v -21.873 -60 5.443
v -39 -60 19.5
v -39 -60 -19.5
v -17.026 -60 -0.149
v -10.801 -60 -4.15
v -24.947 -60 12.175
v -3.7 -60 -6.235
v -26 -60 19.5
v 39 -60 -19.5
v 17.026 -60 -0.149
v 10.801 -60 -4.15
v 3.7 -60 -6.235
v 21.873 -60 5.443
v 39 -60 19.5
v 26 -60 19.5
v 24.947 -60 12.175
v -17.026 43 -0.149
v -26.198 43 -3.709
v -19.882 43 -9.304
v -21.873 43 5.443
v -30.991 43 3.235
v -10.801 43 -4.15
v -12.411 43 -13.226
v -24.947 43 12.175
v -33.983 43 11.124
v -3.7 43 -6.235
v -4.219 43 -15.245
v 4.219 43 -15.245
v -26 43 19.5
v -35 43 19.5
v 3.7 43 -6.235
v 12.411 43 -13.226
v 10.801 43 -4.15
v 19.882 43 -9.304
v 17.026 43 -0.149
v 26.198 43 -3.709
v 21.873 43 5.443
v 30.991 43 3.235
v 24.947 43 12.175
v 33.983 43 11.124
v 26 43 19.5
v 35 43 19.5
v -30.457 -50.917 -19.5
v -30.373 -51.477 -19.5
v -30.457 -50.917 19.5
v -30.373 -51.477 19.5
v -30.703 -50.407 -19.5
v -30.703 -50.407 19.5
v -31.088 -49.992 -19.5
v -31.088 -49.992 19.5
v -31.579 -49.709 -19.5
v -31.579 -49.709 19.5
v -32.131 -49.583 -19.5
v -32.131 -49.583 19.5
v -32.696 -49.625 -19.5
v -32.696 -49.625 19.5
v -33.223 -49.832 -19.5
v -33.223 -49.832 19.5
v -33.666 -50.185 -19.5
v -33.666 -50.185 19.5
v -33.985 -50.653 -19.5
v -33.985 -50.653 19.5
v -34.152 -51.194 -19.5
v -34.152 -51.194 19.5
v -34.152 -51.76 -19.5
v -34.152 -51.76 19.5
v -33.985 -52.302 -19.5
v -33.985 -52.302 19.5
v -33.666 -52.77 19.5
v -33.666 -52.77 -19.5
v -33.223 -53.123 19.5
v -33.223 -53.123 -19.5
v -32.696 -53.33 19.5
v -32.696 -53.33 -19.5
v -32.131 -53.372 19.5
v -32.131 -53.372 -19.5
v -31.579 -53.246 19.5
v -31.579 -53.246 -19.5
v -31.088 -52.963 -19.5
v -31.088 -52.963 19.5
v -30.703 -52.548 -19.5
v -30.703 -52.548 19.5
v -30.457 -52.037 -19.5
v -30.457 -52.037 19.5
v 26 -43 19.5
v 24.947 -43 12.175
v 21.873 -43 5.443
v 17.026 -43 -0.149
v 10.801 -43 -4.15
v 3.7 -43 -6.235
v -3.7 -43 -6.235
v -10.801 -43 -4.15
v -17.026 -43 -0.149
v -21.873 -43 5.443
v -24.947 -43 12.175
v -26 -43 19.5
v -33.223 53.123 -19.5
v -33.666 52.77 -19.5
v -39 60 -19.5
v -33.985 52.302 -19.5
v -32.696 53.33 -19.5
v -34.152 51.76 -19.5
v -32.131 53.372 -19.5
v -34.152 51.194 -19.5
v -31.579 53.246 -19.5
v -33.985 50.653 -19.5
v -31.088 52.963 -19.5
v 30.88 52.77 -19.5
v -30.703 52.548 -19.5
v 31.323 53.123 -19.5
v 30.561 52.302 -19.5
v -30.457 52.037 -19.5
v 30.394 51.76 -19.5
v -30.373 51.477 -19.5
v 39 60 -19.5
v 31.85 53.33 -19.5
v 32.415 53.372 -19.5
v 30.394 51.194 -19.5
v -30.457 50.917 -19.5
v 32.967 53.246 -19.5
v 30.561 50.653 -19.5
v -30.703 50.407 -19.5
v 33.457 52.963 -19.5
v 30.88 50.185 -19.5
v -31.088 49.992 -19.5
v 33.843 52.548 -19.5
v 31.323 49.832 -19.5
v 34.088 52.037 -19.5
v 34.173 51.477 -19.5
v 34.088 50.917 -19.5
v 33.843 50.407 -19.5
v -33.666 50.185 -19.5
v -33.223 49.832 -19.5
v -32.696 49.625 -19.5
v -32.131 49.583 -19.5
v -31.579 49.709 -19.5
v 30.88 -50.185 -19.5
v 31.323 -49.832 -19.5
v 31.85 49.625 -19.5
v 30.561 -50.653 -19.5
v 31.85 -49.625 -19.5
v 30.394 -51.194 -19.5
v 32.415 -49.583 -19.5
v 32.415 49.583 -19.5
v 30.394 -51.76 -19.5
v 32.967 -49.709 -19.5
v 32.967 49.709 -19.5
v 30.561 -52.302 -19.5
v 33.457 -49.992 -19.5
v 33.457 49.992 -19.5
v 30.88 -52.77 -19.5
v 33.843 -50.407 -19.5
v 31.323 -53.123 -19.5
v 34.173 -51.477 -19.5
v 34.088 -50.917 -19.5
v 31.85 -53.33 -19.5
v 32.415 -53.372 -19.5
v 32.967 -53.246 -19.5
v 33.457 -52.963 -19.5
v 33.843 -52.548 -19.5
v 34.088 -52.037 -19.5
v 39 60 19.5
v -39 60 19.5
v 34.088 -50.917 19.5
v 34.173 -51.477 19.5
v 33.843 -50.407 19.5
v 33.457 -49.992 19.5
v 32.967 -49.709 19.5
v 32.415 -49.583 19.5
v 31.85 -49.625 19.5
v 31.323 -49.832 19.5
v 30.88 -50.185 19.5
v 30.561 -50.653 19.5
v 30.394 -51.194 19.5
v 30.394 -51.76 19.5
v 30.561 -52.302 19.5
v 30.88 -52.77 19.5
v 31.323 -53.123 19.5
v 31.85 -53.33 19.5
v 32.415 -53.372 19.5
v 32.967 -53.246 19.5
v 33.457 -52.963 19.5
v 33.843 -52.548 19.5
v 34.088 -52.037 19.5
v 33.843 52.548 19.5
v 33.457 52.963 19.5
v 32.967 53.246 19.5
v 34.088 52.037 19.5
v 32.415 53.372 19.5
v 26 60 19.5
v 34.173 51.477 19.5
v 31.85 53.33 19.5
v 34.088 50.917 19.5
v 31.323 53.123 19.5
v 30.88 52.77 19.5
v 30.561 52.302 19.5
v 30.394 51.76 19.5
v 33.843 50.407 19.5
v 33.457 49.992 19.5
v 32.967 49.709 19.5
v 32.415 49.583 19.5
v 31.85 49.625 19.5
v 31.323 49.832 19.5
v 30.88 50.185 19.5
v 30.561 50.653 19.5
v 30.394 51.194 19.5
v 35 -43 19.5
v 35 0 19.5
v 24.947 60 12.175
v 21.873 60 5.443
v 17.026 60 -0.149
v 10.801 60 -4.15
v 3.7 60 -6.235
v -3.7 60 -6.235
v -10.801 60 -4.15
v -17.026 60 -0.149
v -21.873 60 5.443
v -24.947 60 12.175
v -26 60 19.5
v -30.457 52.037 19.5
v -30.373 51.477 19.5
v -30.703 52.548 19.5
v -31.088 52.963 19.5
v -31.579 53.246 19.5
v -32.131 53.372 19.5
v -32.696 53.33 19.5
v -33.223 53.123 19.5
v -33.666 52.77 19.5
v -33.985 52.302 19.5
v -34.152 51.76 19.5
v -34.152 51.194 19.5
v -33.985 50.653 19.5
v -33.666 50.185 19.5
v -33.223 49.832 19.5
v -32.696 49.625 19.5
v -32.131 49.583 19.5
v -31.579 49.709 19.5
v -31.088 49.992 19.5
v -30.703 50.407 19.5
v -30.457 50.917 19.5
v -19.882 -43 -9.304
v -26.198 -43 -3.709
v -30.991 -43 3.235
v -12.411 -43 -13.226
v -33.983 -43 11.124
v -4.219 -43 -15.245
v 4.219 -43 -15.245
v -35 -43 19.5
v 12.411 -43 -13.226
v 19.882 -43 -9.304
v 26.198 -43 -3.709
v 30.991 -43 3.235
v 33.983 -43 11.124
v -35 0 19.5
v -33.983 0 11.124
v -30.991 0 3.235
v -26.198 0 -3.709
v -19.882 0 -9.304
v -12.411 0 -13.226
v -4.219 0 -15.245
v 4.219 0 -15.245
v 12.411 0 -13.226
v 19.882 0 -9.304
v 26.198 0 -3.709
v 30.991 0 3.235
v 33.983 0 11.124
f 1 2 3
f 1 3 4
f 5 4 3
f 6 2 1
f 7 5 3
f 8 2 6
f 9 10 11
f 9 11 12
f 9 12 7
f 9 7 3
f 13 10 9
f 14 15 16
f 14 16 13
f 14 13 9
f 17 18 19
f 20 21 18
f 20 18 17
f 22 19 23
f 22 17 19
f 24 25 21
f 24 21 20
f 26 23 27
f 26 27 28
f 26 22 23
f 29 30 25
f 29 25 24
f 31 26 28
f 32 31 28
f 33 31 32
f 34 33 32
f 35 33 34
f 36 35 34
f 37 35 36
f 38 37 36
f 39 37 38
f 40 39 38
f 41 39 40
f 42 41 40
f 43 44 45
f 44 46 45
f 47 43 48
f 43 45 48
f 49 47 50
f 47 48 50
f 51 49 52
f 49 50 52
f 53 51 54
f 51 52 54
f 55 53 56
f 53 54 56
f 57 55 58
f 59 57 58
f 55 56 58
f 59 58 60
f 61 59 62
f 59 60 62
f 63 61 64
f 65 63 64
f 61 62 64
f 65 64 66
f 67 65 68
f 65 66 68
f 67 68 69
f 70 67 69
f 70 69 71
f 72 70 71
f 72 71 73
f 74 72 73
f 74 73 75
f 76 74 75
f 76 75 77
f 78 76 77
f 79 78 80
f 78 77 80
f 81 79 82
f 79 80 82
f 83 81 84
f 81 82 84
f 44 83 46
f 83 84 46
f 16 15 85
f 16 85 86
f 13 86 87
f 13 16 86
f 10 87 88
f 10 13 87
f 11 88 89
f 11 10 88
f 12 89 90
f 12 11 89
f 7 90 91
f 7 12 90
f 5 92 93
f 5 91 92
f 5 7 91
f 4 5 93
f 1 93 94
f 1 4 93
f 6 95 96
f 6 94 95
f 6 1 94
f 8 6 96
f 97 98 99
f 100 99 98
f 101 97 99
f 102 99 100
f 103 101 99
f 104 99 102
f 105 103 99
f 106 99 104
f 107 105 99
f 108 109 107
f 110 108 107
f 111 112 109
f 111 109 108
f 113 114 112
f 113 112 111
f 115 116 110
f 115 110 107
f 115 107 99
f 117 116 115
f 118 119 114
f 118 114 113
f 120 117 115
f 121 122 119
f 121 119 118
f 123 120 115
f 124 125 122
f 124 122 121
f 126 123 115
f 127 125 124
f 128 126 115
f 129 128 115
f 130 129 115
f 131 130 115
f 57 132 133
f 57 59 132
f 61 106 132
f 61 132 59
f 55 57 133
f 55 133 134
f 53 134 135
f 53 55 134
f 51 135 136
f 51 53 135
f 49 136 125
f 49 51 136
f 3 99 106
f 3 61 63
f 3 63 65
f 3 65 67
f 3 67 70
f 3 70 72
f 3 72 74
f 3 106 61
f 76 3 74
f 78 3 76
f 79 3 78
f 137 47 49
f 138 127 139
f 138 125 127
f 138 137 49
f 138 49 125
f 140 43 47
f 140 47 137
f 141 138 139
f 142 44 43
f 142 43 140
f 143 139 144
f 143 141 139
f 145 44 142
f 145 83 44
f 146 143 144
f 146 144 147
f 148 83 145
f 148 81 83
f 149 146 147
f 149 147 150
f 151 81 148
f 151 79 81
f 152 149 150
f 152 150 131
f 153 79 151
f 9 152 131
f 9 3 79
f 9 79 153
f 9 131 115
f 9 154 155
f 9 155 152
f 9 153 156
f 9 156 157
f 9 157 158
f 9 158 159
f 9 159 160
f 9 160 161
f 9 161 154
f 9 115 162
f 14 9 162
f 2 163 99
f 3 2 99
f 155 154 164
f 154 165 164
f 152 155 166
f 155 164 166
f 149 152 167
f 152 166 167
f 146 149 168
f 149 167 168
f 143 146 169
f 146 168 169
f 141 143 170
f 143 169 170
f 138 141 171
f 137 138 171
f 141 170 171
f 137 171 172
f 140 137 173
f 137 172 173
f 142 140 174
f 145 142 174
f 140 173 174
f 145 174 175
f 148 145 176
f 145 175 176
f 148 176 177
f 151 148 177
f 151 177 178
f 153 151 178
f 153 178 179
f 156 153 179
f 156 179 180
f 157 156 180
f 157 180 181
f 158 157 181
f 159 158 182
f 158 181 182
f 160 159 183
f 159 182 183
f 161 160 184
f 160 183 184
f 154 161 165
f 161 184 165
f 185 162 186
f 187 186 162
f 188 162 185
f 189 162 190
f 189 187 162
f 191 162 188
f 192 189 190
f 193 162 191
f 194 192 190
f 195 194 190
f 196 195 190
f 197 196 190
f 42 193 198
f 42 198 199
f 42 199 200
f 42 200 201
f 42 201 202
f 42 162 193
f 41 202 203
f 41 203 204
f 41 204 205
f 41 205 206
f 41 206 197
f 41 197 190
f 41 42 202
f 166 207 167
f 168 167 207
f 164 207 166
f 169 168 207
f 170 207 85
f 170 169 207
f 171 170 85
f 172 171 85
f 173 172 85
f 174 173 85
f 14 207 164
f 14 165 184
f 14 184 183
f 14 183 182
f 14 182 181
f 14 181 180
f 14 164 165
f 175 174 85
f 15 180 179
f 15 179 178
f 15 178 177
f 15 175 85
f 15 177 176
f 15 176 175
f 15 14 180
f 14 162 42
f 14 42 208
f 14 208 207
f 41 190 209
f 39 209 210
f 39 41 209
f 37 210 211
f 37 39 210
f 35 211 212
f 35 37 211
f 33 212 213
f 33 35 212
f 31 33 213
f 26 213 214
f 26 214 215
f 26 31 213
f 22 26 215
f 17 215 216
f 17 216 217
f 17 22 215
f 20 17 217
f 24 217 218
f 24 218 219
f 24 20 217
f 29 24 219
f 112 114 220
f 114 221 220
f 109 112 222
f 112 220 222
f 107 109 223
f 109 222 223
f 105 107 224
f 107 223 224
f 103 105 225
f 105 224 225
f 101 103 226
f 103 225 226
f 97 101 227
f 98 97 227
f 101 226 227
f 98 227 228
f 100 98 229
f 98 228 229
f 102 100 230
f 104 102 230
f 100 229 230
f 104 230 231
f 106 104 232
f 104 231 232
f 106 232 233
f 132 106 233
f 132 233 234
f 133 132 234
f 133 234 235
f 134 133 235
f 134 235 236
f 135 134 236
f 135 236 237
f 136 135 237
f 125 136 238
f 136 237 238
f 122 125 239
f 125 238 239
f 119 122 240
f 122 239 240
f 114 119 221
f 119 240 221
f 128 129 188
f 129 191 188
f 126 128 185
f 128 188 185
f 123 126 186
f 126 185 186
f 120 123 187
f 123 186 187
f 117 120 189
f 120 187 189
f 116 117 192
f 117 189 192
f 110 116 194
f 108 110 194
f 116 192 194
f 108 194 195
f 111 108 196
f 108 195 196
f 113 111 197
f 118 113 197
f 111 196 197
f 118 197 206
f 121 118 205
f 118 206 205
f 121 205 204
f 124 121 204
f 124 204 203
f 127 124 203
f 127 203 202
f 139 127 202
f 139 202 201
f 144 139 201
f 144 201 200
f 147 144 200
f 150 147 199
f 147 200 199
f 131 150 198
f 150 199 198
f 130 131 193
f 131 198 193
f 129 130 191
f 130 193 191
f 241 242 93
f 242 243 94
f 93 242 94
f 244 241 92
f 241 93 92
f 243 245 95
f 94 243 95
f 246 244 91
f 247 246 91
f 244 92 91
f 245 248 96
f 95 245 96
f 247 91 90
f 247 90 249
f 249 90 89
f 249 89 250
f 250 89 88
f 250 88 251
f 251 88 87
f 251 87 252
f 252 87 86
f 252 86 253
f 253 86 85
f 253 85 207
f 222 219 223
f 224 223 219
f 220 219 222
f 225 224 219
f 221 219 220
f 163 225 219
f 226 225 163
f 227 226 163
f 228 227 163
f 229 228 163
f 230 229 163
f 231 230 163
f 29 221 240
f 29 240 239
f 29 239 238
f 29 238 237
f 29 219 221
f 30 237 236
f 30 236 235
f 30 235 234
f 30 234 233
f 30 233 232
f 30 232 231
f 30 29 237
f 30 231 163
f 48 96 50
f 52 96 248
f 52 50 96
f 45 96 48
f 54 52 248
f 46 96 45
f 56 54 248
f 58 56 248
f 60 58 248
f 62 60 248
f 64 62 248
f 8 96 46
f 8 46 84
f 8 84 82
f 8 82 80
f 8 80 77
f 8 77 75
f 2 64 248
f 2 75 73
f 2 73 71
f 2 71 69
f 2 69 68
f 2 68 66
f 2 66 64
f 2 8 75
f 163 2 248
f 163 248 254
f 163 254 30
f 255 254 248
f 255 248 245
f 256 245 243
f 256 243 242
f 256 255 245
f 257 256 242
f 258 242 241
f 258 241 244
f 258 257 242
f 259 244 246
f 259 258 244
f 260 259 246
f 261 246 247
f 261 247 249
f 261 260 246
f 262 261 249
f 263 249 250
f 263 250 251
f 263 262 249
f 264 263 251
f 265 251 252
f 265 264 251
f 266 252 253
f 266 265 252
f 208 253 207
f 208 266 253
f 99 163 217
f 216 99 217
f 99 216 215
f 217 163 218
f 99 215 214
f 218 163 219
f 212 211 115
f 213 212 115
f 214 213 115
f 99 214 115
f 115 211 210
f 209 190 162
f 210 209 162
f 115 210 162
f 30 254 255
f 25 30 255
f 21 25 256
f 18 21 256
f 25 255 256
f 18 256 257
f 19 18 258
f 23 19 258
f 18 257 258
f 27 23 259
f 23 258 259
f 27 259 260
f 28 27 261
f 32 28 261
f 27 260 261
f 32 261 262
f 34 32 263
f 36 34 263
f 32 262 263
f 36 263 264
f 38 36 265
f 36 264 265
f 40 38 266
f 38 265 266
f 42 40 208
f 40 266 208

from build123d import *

# Parameters (mm, degrees)
F1_DEPTH      = 60
F1_DEPTH_BACK = 60
F2_R          = 35
F3_DEPTH      = 43
F3_DEPTH_BACK = 43
F4_R          = 1.9
F5_DEPTH      = 50
F5_DEPTH_BACK = 50


with BuildPart() as f1:
    # F0 (on Front) → F1 (new body, two sides)
    with BuildSketch(Plane.XZ) as f1_sk:
        with BuildLine():
            Line((-39, -19.5), (39, -19.5))
            Line((39, -19.5), (39, 19.5))
            Line((39, 19.5), (26, 19.5))
            ThreePointArc((26, 19.5), (0, -6.5), (-26, 19.5))
            Line((-26, 19.5), (-39, 19.5))
            Line((-39, 19.5), (-39, -19.5))
        make_face()
    extrude(amount=F1_DEPTH)
    extrude(f1_sk.sketch, amount=-F1_DEPTH_BACK)

    # F2 (on Front) → F3 (cut, two sides)
    with BuildSketch(Plane.XZ) as f3_sk:
        with Locations((0, 19.5)):
            Circle(F2_R)
    extrude(amount=-F3_DEPTH, mode=Mode.SUBTRACT)
    extrude(f3_sk.sketch, amount=F3_DEPTH_BACK, mode=Mode.SUBTRACT)

    # F4 (on Top) → F5 (cut, two sides)
    with BuildSketch(Plane.XY) as f5_sk:
        with Locations((-32.2727300227, 51.4772757888)):
            Circle(F4_R)
        with Locations((32.2727300227, 51.4772757888)):
            Circle(F4_R)
        with Locations((32.2727300227, -51.4772757888)):
            Circle(F4_R)
        with Locations((-32.2727300227, -51.4772757888)):
            Circle(F4_R)
    extrude(amount=-F5_DEPTH, mode=Mode.SUBTRACT)
    extrude(f5_sk.sketch, amount=F5_DEPTH_BACK, mode=Mode.SUBTRACT)


solid = f1.part
